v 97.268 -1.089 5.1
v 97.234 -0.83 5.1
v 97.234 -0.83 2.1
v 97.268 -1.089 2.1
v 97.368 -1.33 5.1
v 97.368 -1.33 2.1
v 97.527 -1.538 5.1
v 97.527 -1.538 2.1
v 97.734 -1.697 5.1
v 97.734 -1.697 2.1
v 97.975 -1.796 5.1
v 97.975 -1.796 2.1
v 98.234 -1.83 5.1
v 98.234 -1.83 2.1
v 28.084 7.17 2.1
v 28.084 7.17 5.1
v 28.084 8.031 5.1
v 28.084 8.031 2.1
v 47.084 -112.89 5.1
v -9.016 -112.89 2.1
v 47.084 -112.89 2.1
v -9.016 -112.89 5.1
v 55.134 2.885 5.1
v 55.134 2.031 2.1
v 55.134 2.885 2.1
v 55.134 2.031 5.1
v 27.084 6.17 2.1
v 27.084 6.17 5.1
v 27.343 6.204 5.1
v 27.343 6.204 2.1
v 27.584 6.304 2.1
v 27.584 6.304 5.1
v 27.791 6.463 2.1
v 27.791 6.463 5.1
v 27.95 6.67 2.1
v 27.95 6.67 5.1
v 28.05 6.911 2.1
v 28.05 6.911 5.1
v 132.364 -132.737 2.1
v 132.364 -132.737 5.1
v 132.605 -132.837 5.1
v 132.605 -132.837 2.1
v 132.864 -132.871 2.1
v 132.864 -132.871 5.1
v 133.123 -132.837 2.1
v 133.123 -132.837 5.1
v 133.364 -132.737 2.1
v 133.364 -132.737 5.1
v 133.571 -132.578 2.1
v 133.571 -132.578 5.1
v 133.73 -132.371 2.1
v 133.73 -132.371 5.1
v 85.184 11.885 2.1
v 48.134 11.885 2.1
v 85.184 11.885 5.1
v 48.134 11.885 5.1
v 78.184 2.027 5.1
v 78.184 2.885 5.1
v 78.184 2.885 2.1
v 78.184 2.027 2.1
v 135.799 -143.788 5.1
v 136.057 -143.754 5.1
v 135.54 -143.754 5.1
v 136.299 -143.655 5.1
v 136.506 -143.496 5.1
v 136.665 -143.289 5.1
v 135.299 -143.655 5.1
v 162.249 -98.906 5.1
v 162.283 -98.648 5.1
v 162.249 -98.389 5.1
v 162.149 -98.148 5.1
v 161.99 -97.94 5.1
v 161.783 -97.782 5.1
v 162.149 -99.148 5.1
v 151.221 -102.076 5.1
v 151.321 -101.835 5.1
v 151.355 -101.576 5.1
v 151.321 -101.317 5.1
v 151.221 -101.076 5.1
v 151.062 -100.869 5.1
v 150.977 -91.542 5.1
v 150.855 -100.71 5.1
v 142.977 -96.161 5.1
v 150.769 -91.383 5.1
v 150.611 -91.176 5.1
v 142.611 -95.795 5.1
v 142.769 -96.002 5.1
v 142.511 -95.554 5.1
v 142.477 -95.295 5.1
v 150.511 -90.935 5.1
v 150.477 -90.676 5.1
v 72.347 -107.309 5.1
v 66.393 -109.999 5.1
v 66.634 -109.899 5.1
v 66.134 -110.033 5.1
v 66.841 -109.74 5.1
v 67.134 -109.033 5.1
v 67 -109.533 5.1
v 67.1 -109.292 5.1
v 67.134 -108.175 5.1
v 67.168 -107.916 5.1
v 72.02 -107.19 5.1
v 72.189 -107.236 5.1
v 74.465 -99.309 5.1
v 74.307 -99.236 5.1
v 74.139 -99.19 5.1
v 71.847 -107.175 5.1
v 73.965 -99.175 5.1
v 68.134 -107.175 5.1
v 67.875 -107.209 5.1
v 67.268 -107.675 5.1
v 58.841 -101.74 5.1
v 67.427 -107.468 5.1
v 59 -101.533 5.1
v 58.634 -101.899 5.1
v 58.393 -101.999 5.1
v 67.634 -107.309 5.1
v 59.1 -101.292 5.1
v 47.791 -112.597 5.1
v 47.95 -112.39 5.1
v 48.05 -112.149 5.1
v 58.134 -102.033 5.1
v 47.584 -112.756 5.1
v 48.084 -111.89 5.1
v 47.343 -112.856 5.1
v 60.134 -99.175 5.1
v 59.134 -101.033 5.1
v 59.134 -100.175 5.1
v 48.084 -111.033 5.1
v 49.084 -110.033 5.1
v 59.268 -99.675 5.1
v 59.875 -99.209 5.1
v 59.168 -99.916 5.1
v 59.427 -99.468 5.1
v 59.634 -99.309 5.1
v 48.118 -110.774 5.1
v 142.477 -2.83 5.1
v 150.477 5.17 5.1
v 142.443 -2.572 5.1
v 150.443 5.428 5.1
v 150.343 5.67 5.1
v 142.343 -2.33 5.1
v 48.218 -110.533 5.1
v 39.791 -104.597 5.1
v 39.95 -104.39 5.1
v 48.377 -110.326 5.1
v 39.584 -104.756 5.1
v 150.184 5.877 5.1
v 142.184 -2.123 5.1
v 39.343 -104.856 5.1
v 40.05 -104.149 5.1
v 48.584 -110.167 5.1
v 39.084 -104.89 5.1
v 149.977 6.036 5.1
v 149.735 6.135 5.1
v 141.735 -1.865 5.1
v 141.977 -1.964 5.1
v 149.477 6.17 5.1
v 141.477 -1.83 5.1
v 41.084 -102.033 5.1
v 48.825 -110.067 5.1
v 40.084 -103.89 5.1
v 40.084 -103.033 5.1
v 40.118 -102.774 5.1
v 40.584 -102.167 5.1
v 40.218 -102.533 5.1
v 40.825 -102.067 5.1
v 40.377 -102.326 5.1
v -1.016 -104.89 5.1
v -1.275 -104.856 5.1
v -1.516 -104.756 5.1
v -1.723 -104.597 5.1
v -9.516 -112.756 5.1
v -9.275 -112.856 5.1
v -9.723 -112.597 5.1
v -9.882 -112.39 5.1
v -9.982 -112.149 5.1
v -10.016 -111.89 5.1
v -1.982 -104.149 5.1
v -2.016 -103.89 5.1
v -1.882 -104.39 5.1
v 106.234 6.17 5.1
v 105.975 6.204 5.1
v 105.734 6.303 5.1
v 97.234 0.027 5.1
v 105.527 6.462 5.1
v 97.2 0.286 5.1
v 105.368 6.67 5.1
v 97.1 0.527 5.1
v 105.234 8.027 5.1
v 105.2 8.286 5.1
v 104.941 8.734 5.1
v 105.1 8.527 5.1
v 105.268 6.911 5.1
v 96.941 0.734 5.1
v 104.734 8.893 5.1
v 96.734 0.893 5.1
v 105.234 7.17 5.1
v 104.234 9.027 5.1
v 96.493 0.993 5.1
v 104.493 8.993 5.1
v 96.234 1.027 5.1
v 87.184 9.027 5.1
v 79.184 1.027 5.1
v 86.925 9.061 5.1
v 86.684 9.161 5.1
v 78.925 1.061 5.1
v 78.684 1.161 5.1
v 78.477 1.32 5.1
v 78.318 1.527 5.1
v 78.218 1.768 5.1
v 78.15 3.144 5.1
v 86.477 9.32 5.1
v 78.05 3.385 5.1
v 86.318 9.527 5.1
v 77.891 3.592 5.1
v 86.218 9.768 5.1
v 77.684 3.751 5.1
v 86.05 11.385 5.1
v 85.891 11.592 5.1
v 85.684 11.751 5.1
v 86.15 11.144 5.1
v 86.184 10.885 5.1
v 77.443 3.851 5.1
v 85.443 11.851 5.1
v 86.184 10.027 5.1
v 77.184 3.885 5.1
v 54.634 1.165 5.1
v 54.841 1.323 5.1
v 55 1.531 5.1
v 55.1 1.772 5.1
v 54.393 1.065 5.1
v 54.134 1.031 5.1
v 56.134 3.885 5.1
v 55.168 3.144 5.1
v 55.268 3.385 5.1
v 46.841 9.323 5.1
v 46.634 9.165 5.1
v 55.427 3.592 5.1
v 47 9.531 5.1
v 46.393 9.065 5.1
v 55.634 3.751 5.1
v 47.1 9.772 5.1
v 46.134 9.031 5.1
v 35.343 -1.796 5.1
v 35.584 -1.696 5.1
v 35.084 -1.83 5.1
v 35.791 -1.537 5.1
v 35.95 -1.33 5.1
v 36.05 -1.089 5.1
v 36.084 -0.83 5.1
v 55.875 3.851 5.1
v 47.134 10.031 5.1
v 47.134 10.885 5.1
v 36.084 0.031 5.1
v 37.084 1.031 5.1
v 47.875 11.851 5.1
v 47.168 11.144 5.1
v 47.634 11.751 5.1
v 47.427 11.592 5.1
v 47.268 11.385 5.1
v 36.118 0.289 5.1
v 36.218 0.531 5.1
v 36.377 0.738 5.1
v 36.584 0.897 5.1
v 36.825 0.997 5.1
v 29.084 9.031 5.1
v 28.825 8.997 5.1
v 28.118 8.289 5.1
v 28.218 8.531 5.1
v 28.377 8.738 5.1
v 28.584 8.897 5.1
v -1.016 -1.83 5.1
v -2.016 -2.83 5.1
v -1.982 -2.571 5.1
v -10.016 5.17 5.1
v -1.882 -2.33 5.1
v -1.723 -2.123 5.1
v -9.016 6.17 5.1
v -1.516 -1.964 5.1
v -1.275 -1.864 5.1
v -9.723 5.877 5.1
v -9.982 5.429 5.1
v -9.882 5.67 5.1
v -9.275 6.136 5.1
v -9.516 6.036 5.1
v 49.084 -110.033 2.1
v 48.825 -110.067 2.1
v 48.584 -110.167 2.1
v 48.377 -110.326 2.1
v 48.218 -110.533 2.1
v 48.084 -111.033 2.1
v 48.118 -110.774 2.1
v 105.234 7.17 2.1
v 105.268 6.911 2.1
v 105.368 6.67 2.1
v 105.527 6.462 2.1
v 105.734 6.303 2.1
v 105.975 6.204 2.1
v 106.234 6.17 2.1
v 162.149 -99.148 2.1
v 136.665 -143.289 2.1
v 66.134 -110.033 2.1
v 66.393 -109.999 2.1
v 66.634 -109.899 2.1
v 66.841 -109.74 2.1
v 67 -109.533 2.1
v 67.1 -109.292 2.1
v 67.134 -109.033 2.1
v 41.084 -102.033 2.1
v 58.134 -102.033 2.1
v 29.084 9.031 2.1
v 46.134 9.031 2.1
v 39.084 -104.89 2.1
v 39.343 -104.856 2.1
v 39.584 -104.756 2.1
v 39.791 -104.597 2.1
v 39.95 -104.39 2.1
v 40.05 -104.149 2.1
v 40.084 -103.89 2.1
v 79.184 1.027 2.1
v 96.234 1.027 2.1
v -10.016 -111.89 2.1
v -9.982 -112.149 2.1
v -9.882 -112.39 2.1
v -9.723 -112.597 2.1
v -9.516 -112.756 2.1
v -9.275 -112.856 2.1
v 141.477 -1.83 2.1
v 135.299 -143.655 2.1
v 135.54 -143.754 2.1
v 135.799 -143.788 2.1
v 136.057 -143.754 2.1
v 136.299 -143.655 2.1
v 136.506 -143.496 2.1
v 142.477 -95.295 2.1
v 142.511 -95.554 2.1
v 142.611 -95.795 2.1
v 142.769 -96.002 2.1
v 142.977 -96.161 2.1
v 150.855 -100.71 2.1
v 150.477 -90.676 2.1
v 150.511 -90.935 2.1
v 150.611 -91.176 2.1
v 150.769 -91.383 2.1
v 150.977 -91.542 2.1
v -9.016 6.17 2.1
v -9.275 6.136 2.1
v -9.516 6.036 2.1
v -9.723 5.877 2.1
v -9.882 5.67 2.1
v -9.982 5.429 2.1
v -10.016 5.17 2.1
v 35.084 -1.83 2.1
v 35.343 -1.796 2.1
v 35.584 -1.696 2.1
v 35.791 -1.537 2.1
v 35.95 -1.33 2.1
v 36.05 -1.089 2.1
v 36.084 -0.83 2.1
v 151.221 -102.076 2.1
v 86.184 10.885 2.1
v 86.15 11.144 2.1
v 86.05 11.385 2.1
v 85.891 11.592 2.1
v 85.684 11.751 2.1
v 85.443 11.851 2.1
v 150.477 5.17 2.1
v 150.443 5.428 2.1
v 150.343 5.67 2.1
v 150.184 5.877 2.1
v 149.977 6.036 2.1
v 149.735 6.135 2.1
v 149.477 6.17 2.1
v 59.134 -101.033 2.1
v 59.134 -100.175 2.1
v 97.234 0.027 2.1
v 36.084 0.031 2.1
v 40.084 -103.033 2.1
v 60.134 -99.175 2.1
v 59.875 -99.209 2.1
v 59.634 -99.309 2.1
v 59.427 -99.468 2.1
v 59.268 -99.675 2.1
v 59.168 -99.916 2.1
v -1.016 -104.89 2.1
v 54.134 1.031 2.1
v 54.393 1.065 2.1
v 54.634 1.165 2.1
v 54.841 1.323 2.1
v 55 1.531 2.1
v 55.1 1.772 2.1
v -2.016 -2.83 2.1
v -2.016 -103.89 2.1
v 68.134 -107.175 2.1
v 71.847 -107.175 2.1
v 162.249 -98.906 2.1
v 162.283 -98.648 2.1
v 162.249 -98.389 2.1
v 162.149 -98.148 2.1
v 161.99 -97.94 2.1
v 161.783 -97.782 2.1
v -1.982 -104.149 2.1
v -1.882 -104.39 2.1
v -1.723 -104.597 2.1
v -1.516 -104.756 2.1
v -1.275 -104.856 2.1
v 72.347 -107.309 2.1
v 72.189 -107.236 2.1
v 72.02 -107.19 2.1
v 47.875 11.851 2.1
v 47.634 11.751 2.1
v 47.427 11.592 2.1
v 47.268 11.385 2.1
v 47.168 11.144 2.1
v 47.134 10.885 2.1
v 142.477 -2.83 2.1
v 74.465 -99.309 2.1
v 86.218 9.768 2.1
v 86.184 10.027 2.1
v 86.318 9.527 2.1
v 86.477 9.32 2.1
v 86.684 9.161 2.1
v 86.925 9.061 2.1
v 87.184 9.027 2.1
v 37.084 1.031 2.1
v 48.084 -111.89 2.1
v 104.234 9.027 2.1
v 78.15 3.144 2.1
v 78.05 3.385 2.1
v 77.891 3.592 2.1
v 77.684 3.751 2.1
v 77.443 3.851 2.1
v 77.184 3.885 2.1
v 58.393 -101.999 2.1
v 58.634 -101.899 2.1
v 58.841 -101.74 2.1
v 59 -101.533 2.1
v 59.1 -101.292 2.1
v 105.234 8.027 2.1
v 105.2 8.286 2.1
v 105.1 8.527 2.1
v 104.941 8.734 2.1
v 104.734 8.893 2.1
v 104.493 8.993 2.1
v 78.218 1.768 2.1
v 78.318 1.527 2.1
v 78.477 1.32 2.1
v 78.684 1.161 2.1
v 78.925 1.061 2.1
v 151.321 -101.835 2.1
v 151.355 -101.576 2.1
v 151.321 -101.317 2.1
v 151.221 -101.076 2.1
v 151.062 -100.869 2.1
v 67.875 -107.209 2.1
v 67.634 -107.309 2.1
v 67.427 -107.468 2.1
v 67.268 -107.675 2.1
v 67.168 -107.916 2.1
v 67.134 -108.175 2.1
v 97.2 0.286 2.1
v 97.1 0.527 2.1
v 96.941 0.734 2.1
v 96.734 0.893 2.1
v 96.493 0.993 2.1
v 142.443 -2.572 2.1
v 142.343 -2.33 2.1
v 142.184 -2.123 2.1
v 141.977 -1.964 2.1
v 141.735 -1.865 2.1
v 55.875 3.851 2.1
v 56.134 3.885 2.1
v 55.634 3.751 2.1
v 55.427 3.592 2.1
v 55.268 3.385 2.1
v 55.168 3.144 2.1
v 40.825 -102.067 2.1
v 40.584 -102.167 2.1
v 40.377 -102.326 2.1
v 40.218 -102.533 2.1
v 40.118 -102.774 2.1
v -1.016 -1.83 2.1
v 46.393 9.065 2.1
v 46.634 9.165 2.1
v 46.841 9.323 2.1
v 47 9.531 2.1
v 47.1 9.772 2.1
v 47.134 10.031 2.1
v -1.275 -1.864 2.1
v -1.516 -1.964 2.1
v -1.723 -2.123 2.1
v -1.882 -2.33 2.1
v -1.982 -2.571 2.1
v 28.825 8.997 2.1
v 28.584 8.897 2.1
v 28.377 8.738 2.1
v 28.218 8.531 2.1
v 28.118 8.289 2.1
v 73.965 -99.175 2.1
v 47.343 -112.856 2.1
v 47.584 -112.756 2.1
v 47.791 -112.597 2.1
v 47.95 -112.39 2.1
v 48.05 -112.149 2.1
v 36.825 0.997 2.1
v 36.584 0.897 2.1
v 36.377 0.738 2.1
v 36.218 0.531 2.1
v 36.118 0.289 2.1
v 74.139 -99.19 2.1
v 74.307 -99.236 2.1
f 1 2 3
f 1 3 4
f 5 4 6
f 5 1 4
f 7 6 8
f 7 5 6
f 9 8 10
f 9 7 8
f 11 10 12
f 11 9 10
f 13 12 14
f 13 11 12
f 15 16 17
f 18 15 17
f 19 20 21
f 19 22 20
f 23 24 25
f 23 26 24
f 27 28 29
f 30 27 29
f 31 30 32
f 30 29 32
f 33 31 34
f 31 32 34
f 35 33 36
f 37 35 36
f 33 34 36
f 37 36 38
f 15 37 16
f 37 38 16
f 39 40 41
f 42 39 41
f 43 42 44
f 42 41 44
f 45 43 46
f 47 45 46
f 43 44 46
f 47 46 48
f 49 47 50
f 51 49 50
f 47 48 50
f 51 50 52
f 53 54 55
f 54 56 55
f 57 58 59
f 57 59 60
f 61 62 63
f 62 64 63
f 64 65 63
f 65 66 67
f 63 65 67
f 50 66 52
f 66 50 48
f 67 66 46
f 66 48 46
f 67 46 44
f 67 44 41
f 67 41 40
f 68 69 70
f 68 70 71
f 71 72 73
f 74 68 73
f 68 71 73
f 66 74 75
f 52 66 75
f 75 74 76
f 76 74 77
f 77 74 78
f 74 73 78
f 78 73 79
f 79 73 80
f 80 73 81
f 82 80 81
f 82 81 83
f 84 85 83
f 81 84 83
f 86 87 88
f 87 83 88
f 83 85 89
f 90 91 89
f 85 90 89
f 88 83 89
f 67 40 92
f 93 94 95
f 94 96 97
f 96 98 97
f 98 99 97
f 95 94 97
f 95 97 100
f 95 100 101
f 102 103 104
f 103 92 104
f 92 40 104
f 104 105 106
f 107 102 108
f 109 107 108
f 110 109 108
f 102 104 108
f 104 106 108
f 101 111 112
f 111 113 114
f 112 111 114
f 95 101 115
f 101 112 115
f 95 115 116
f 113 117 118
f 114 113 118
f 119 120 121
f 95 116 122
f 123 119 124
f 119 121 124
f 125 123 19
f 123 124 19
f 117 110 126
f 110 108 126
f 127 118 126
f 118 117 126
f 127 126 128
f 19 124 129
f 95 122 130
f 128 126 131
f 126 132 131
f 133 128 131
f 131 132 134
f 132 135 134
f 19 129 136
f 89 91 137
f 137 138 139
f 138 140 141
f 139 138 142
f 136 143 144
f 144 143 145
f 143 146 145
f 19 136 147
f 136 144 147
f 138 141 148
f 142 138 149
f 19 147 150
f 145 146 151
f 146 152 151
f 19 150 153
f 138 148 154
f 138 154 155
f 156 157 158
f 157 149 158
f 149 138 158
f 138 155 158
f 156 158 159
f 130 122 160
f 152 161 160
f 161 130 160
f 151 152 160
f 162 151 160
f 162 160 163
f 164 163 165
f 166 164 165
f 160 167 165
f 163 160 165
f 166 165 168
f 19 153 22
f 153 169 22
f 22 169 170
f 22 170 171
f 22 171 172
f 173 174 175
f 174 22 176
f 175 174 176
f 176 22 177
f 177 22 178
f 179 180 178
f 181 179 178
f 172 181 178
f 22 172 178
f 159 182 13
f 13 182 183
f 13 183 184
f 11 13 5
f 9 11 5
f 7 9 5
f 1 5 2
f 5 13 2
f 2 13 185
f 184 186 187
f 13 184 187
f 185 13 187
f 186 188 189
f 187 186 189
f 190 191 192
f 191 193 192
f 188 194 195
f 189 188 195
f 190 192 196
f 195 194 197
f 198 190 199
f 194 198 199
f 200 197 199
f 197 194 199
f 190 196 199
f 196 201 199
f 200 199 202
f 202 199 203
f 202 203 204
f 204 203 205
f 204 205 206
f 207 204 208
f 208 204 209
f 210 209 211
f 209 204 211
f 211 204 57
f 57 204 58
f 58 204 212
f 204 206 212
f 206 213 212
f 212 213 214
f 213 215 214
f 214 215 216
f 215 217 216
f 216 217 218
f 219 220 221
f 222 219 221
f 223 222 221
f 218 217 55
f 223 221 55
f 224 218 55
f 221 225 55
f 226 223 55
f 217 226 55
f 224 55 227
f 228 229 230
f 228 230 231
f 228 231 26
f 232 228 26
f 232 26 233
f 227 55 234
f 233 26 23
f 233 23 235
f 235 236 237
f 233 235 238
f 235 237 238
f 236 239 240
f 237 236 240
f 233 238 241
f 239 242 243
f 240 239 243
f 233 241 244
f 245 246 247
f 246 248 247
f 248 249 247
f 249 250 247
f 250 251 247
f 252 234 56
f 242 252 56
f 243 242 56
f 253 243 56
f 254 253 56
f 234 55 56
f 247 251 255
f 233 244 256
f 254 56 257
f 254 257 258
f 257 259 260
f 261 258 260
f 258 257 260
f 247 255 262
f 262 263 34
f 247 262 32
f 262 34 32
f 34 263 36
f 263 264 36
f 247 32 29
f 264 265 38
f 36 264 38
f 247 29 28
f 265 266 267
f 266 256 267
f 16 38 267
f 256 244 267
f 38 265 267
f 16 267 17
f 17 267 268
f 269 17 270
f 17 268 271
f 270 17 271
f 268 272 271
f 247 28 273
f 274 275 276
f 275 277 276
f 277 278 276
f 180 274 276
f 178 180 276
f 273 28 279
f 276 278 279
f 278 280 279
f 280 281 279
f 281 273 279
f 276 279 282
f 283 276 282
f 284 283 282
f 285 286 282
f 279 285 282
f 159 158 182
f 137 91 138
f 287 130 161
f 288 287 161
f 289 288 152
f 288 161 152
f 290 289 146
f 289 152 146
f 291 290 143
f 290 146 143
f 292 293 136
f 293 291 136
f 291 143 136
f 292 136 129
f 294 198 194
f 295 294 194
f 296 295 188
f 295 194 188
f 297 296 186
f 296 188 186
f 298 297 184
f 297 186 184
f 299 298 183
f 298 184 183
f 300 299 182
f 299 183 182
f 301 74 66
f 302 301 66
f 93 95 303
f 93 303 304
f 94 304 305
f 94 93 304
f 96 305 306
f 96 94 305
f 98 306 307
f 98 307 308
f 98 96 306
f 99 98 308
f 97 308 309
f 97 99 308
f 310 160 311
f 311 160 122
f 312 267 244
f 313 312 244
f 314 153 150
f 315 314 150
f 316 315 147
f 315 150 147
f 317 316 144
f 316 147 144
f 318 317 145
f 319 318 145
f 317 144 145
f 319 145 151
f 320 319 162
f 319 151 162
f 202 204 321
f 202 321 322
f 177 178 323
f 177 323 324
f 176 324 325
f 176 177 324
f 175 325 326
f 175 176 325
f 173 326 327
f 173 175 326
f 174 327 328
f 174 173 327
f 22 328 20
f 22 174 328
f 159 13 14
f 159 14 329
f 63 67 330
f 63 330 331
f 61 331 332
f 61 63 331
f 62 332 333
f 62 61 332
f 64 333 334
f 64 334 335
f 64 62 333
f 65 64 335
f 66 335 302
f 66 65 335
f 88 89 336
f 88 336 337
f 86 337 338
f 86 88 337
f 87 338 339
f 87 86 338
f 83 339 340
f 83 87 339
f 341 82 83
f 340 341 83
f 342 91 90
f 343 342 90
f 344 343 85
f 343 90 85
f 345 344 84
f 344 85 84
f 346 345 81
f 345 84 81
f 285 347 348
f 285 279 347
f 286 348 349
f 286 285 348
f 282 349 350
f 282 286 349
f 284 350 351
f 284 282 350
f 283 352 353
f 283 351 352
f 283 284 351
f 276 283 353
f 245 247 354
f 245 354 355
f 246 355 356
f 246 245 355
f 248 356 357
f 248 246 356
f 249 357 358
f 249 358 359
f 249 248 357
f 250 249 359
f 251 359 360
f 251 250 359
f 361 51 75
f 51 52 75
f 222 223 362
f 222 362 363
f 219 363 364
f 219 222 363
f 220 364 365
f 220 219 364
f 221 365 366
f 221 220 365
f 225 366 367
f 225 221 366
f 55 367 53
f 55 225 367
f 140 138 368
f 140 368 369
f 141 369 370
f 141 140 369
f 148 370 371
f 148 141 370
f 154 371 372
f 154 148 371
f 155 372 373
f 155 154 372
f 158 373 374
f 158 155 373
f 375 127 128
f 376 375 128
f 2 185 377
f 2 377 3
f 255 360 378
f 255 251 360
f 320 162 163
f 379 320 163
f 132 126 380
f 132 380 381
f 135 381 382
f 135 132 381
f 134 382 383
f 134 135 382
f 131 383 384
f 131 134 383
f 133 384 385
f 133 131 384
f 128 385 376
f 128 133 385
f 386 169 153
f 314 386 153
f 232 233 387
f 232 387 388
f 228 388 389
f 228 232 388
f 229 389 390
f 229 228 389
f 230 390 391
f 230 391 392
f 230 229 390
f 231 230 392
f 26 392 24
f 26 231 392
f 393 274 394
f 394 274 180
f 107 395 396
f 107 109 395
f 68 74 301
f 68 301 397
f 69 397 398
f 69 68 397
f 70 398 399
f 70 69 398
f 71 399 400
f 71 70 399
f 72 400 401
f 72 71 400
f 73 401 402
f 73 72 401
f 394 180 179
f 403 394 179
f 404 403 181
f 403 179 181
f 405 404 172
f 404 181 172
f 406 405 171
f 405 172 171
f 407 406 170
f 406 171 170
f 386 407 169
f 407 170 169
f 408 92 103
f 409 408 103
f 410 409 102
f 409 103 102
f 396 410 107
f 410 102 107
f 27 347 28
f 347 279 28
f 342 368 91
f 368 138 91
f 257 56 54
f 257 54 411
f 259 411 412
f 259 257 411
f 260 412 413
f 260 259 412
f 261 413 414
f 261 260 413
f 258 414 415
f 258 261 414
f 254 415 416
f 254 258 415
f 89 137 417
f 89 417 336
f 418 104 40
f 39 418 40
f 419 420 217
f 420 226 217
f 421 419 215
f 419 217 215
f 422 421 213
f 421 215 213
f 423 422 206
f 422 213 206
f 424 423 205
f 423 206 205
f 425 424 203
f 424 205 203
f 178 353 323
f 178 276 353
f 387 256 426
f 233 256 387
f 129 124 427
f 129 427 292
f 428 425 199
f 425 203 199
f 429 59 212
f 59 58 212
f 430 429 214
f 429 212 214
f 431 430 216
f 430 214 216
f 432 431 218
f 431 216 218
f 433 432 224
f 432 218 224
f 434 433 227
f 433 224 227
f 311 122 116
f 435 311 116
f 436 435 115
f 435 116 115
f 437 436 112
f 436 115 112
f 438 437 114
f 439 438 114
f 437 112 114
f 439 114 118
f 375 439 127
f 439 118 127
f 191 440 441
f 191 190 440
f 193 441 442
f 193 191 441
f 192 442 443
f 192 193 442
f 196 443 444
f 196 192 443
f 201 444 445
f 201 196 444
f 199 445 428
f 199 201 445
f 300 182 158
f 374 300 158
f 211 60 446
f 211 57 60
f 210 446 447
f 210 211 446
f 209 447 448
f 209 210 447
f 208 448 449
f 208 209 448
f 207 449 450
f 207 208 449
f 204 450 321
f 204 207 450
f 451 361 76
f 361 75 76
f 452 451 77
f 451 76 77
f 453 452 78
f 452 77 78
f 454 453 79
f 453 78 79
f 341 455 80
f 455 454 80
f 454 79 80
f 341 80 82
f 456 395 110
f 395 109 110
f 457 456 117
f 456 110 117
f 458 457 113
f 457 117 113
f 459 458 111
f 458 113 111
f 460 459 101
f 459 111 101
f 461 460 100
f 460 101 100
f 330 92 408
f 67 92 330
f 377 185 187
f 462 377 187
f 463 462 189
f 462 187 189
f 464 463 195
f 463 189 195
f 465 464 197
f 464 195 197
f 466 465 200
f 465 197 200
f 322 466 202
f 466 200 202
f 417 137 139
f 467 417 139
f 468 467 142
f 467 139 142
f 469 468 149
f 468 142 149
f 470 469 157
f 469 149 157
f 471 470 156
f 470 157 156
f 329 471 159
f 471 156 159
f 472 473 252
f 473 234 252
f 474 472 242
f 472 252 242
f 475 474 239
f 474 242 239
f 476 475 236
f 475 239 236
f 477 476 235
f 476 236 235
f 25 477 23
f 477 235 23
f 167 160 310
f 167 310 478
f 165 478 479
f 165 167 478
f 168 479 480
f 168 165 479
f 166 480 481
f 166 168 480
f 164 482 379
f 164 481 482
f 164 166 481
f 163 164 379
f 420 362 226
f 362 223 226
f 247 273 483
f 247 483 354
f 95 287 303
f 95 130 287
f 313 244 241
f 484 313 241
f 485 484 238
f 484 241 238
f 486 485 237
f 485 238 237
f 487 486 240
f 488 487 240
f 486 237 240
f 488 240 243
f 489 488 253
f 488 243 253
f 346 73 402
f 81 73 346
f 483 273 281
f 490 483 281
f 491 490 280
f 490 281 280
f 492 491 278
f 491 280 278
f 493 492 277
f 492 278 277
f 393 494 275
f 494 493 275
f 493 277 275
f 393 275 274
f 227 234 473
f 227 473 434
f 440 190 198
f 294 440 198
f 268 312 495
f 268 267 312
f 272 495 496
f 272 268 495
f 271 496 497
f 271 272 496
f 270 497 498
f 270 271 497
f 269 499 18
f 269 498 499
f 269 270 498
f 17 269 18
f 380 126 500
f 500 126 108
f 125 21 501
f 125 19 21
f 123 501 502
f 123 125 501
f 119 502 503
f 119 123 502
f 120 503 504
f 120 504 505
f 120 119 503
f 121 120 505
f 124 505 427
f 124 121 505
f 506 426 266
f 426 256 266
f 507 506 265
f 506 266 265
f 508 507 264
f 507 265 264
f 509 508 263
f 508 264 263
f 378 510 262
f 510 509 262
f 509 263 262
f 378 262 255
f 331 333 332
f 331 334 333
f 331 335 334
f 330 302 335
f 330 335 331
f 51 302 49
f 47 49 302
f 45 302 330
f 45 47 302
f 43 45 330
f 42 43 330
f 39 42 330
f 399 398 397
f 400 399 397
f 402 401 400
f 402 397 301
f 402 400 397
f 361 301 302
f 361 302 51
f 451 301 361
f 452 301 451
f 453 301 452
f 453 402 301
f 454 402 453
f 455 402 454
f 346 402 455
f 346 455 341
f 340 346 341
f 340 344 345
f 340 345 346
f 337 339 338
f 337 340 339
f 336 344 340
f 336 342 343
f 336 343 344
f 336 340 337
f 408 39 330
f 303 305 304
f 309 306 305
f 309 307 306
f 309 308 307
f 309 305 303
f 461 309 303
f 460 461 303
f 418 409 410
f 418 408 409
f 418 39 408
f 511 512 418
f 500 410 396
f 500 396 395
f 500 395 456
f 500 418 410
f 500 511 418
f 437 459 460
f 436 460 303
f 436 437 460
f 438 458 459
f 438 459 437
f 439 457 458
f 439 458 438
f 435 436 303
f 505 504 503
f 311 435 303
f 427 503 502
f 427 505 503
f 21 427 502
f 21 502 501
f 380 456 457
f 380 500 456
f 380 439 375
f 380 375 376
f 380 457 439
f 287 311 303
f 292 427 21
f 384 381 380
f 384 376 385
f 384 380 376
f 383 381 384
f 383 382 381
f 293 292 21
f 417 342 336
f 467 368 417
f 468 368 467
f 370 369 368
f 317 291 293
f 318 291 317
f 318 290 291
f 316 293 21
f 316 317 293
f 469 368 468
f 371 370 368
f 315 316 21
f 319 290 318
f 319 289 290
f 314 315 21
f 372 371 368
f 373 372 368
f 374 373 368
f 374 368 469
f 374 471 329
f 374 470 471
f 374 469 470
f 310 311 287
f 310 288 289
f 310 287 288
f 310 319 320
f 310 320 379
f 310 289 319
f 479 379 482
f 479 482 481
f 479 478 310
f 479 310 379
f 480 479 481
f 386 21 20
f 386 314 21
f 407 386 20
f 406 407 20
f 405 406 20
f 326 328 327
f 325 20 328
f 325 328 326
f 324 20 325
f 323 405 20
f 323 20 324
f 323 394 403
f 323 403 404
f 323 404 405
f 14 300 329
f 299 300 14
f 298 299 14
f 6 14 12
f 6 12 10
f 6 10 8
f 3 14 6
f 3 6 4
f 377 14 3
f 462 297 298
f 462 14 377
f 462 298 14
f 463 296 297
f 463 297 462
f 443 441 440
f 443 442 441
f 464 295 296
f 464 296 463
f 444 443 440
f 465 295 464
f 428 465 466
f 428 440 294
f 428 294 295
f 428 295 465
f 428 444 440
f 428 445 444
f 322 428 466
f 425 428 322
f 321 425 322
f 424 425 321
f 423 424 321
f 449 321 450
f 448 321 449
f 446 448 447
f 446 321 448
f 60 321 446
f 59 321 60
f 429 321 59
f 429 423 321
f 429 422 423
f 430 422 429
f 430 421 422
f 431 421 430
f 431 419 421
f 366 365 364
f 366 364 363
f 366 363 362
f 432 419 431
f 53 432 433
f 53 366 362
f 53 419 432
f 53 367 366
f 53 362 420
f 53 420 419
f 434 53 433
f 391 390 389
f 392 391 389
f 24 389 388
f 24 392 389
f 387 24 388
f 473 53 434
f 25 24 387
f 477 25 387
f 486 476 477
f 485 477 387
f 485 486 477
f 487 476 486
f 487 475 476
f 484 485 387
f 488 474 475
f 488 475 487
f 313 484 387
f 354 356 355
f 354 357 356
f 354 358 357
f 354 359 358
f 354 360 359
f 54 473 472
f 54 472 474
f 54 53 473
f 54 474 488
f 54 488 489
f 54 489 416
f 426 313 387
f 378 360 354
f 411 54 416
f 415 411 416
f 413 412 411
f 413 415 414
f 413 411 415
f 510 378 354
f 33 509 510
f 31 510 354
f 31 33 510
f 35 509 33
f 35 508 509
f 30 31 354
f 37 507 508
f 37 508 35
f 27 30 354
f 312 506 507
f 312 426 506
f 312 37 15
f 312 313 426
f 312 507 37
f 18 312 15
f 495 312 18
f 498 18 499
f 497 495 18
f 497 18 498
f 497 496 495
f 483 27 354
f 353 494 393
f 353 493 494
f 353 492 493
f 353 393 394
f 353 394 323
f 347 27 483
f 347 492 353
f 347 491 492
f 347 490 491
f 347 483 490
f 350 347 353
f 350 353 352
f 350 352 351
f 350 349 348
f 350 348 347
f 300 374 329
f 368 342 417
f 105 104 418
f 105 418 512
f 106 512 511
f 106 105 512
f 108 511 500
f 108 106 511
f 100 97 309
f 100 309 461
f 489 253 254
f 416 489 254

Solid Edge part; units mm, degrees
sketch "Sketch1" plane through (74.3033, -64.1291, 5.1) normal (0, 0, 1) x (1, 0, 0)
  line L0 (-45.2193, 73.1597) -> (-28.1693, 73.1597)
  arc A0 (-28.1693, 73.1597) -> (-27.1693, 74.1597) centre (-28.1693, 74.1597) ccw
  line L1 (-27.1693, 74.1597) -> (-27.1693, 75.0138)
  arc A1 (-26.1693, 76.0138) -> (-27.1693, 75.0138) centre (-26.1693, 75.0138) ccw
  line L2 (-26.1693, 76.0138) -> (10.8807, 76.0138)
  arc A2 (10.8807, 76.0138) -> (11.8807, 75.0138) centre (10.8807, 75.0138) cw
  line L3 (11.8807, 75.0138) -> (11.8807, 74.1563)
  arc A3 (12.8807, 73.1563) -> (11.8807, 74.1563) centre (12.8807, 74.1563) cw
  line L4 (12.8807, 73.1563) -> (29.9307, 73.1563)
  arc A4 (29.9307, 73.1563) -> (30.9307, 72.1563) centre (29.9307, 72.1563) cw
  line L5 (30.9307, 72.1563) -> (30.9307, 71.2986)
  arc A5 (31.9307, 70.2986) -> (30.9307, 71.2986) centre (31.9307, 71.2986) cw
  line L6 (31.9307, 70.2986) -> (75.1733, 70.2986)
  arc A6 (75.1733, 70.2986) -> (76.1733, 69.2986) centre (75.1733, 69.2986) cw
  line L7 (76.1733, 69.2986) -> (76.1733, -26.5472)
  arc A7 (76.1733, -26.5472) -> (76.6733, -27.4132) centre (77.1733, -26.5472) ccw
  line L8 (87.48, -33.6525) -> (76.6733, -27.4132)
  arc A8 (87.48, -33.6525) -> (87.8461, -35.0185) centre (86.98, -34.5185) cw
  line L9 (87.8461, -35.0185) -> (62.3613, -79.1594)
  arc A9 (60.9953, -79.5254) -> (62.3613, -79.1594) centre (61.4953, -78.6594) ccw
  line L10 (-1.9566, -43.1802) -> (60.9953, -79.5254)
  arc A10 (-2.4566, -43.0462) -> (-1.9566, -43.1802) centre (-2.4566, -44.0462) cw
  line L11 (-6.1693, -43.0462) -> (-2.4566, -43.0462)
  arc A11 (-6.1693, -43.0462) -> (-7.1693, -44.0462) centre (-6.1693, -44.0462) ccw
  line L12 (-7.1693, -44.9037) -> (-7.1693, -44.0462)
  arc A12 (-8.1693, -45.9037) -> (-7.1693, -44.9037) centre (-8.1693, -44.9037) ccw
  line L13 (-25.2193, -45.9037) -> (-8.1693, -45.9037)
  arc A13 (-26.2193, -46.9037) -> (-25.2193, -45.9037) centre (-25.2193, -46.9037) cw
  line L14 (-26.2193, -47.7612) -> (-26.2193, -46.9037)
  arc A14 (-27.2193, -48.7612) -> (-26.2193, -47.7612) centre (-27.2193, -47.7612) ccw
  line L15 (-83.3193, -48.7612) -> (-27.2193, -48.7612)
  arc A15 (-84.3193, -47.7612) -> (-83.3193, -48.7612) centre (-83.3193, -47.7612) ccw
  line L16 (-84.3193, 69.2988) -> (-84.3193, -47.7612)
  arc A16 (-84.3193, 69.2988) -> (-83.3193, 70.2988) centre (-83.3193, 69.2988) cw
  line L17 (-83.3193, 70.2988) -> (-47.2193, 70.2988)
  arc A17 (-47.2193, 70.2988) -> (-46.2193, 71.2988) centre (-47.2193, 71.2988) ccw
  line L18 (-46.2193, 71.2988) -> (-46.2193, 72.1597)
  arc A18 (-46.2193, 72.1597) -> (-45.2193, 73.1597) centre (-45.2193, 72.1597) cw
  line L19 (-18.1693, 68.0138) -> (2.8807, 68.0138)
  arc A19 (2.8807, 68.0138) -> (3.8807, 67.0138) centre (2.8807, 67.0138) cw
  line L20 (3.8807, 67.0138) -> (3.8807, 66.1563)
  arc A20 (4.8807, 65.1563) -> (3.8807, 66.1563) centre (4.8807, 66.1563) cw
  line L21 (4.8807, 65.1563) -> (21.9307, 65.1563)
  arc A21 (21.9307, 65.1563) -> (22.9307, 64.1563) centre (21.9307, 64.1563) cw
  line L22 (22.9307, 64.1563) -> (22.9307, 63.2986)
  arc A22 (23.9307, 62.2986) -> (22.9307, 63.2986) centre (23.9307, 63.2986) cw
  line L23 (23.9307, 62.2986) -> (67.1733, 62.2986)
  arc A23 (67.1733, 62.2986) -> (68.1733, 61.2986) centre (67.1733, 61.2986) cw
  line L24 (68.1733, 61.2986) -> (68.1733, -31.1662)
  arc A24 (68.1733, -31.1662) -> (68.6733, -32.0322) centre (69.1733, -31.1662) ccw
  line L25 (76.5517, -36.5808) -> (68.6733, -32.0322)
  arc A25 (76.5517, -36.5808) -> (76.9178, -37.9468) centre (76.0517, -37.4468) cw
  line L26 (59.4268, -68.2421) -> (76.9178, -37.9468)
  arc A26 (58.0608, -68.6081) -> (59.4268, -68.2421) centre (58.5608, -67.7421) ccw
  line L27 (0.1618, -35.1802) -> (58.0608, -68.6081)
  arc A27 (-0.3382, -35.0462) -> (0.1618, -35.1802) centre (-0.3382, -36.0462) cw
  line L28 (-14.1693, -35.0462) -> (-0.3382, -35.0462)
  arc A28 (-14.1693, -35.0462) -> (-15.1693, -36.0462) centre (-14.1693, -36.0462) ccw
  line L29 (-15.1693, -36.9037) -> (-15.1693, -36.0462)
  arc A29 (-16.1693, -37.9037) -> (-15.1693, -36.9037) centre (-16.1693, -36.9037) ccw
  line L30 (-33.2193, -37.9037) -> (-16.1693, -37.9037)
  arc A30 (-34.2193, -38.9037) -> (-33.2193, -37.9037) centre (-33.2193, -38.9037) cw
  line L31 (-34.2193, -39.7612) -> (-34.2193, -38.9037)
  arc A31 (-35.2193, -40.7612) -> (-34.2193, -39.7612) centre (-35.2193, -39.7612) ccw
  line L32 (-75.3193, -40.7612) -> (-35.2193, -40.7612)
  arc A32 (-76.3193, -39.7612) -> (-75.3193, -40.7612) centre (-75.3193, -39.7612) ccw
  line L33 (-76.3193, 61.2988) -> (-76.3193, -39.7612)
  arc A33 (-76.3193, 61.2988) -> (-75.3193, 62.2988) centre (-75.3193, 61.2988) cw
  line L34 (-75.3193, 62.2988) -> (-39.2193, 62.2988)
  arc A34 (-39.2193, 62.2988) -> (-38.2193, 63.2988) centre (-39.2193, 63.2988) ccw
  line L35 (-38.2193, 63.2988) -> (-38.2193, 64.1597)
  arc A35 (-38.2193, 64.1597) -> (-37.2193, 65.1597) centre (-37.2193, 64.1597) cw
  line L36 (-37.2193, 65.1597) -> (-20.1693, 65.1597)
  arc A36 (-20.1693, 65.1597) -> (-19.1693, 66.1597) centre (-20.1693, 66.1597) ccw
  line L37 (-19.1693, 66.1597) -> (-19.1693, 67.0138)
  arc A37 (-18.1693, 68.0138) -> (-19.1693, 67.0138) centre (-18.1693, 67.0138) ccw
  dimension "D1" = 10
  dimension "D2" = 10
  dimension "D3" = 10
  dimension "D4" = 10
  dimension "D5" = 10
  dimension "D6" = 10
  dimension "D7" = 10
  dimension "D8" = 10
  dimension "D9" = 10
  dimension "D10" = 10
  dimension "D11" = 9.9984
  dimension "D12" = 10
  dimension "D13" = 10
  dimension "D14" = 1
  dimension "D15" = 1
  dimension "D16" = 1
  dimension "D17" = 1
  dimension "D18" = 1
  dimension "D19" = 1
  dimension "D20" = 1
  dimension "D21" = 1
  dimension "D22" = 1
  dimension "D23" = 1
  dimension "D24" = 1
  dimension "D25" = 1
  dimension "D26" = 1
  dimension "D27" = 1
  dimension "D28" = 1
  dimension "D29" = 1
  dimension "D30" = 1
  dimension "D31" = 1
  dimension "D32" = 1
  dimension "D33" = 10
  dimension "D34" = 10
  dimension "D35" = 10
  dimension "D36" = 10
  dimension "D37" = 10
  dimension "D38" = 10
extrude "ExtrudedProtrusion_4" add sketch "Sketch1" against normal blind 3
properties material "ABS Plastic, high impact"
